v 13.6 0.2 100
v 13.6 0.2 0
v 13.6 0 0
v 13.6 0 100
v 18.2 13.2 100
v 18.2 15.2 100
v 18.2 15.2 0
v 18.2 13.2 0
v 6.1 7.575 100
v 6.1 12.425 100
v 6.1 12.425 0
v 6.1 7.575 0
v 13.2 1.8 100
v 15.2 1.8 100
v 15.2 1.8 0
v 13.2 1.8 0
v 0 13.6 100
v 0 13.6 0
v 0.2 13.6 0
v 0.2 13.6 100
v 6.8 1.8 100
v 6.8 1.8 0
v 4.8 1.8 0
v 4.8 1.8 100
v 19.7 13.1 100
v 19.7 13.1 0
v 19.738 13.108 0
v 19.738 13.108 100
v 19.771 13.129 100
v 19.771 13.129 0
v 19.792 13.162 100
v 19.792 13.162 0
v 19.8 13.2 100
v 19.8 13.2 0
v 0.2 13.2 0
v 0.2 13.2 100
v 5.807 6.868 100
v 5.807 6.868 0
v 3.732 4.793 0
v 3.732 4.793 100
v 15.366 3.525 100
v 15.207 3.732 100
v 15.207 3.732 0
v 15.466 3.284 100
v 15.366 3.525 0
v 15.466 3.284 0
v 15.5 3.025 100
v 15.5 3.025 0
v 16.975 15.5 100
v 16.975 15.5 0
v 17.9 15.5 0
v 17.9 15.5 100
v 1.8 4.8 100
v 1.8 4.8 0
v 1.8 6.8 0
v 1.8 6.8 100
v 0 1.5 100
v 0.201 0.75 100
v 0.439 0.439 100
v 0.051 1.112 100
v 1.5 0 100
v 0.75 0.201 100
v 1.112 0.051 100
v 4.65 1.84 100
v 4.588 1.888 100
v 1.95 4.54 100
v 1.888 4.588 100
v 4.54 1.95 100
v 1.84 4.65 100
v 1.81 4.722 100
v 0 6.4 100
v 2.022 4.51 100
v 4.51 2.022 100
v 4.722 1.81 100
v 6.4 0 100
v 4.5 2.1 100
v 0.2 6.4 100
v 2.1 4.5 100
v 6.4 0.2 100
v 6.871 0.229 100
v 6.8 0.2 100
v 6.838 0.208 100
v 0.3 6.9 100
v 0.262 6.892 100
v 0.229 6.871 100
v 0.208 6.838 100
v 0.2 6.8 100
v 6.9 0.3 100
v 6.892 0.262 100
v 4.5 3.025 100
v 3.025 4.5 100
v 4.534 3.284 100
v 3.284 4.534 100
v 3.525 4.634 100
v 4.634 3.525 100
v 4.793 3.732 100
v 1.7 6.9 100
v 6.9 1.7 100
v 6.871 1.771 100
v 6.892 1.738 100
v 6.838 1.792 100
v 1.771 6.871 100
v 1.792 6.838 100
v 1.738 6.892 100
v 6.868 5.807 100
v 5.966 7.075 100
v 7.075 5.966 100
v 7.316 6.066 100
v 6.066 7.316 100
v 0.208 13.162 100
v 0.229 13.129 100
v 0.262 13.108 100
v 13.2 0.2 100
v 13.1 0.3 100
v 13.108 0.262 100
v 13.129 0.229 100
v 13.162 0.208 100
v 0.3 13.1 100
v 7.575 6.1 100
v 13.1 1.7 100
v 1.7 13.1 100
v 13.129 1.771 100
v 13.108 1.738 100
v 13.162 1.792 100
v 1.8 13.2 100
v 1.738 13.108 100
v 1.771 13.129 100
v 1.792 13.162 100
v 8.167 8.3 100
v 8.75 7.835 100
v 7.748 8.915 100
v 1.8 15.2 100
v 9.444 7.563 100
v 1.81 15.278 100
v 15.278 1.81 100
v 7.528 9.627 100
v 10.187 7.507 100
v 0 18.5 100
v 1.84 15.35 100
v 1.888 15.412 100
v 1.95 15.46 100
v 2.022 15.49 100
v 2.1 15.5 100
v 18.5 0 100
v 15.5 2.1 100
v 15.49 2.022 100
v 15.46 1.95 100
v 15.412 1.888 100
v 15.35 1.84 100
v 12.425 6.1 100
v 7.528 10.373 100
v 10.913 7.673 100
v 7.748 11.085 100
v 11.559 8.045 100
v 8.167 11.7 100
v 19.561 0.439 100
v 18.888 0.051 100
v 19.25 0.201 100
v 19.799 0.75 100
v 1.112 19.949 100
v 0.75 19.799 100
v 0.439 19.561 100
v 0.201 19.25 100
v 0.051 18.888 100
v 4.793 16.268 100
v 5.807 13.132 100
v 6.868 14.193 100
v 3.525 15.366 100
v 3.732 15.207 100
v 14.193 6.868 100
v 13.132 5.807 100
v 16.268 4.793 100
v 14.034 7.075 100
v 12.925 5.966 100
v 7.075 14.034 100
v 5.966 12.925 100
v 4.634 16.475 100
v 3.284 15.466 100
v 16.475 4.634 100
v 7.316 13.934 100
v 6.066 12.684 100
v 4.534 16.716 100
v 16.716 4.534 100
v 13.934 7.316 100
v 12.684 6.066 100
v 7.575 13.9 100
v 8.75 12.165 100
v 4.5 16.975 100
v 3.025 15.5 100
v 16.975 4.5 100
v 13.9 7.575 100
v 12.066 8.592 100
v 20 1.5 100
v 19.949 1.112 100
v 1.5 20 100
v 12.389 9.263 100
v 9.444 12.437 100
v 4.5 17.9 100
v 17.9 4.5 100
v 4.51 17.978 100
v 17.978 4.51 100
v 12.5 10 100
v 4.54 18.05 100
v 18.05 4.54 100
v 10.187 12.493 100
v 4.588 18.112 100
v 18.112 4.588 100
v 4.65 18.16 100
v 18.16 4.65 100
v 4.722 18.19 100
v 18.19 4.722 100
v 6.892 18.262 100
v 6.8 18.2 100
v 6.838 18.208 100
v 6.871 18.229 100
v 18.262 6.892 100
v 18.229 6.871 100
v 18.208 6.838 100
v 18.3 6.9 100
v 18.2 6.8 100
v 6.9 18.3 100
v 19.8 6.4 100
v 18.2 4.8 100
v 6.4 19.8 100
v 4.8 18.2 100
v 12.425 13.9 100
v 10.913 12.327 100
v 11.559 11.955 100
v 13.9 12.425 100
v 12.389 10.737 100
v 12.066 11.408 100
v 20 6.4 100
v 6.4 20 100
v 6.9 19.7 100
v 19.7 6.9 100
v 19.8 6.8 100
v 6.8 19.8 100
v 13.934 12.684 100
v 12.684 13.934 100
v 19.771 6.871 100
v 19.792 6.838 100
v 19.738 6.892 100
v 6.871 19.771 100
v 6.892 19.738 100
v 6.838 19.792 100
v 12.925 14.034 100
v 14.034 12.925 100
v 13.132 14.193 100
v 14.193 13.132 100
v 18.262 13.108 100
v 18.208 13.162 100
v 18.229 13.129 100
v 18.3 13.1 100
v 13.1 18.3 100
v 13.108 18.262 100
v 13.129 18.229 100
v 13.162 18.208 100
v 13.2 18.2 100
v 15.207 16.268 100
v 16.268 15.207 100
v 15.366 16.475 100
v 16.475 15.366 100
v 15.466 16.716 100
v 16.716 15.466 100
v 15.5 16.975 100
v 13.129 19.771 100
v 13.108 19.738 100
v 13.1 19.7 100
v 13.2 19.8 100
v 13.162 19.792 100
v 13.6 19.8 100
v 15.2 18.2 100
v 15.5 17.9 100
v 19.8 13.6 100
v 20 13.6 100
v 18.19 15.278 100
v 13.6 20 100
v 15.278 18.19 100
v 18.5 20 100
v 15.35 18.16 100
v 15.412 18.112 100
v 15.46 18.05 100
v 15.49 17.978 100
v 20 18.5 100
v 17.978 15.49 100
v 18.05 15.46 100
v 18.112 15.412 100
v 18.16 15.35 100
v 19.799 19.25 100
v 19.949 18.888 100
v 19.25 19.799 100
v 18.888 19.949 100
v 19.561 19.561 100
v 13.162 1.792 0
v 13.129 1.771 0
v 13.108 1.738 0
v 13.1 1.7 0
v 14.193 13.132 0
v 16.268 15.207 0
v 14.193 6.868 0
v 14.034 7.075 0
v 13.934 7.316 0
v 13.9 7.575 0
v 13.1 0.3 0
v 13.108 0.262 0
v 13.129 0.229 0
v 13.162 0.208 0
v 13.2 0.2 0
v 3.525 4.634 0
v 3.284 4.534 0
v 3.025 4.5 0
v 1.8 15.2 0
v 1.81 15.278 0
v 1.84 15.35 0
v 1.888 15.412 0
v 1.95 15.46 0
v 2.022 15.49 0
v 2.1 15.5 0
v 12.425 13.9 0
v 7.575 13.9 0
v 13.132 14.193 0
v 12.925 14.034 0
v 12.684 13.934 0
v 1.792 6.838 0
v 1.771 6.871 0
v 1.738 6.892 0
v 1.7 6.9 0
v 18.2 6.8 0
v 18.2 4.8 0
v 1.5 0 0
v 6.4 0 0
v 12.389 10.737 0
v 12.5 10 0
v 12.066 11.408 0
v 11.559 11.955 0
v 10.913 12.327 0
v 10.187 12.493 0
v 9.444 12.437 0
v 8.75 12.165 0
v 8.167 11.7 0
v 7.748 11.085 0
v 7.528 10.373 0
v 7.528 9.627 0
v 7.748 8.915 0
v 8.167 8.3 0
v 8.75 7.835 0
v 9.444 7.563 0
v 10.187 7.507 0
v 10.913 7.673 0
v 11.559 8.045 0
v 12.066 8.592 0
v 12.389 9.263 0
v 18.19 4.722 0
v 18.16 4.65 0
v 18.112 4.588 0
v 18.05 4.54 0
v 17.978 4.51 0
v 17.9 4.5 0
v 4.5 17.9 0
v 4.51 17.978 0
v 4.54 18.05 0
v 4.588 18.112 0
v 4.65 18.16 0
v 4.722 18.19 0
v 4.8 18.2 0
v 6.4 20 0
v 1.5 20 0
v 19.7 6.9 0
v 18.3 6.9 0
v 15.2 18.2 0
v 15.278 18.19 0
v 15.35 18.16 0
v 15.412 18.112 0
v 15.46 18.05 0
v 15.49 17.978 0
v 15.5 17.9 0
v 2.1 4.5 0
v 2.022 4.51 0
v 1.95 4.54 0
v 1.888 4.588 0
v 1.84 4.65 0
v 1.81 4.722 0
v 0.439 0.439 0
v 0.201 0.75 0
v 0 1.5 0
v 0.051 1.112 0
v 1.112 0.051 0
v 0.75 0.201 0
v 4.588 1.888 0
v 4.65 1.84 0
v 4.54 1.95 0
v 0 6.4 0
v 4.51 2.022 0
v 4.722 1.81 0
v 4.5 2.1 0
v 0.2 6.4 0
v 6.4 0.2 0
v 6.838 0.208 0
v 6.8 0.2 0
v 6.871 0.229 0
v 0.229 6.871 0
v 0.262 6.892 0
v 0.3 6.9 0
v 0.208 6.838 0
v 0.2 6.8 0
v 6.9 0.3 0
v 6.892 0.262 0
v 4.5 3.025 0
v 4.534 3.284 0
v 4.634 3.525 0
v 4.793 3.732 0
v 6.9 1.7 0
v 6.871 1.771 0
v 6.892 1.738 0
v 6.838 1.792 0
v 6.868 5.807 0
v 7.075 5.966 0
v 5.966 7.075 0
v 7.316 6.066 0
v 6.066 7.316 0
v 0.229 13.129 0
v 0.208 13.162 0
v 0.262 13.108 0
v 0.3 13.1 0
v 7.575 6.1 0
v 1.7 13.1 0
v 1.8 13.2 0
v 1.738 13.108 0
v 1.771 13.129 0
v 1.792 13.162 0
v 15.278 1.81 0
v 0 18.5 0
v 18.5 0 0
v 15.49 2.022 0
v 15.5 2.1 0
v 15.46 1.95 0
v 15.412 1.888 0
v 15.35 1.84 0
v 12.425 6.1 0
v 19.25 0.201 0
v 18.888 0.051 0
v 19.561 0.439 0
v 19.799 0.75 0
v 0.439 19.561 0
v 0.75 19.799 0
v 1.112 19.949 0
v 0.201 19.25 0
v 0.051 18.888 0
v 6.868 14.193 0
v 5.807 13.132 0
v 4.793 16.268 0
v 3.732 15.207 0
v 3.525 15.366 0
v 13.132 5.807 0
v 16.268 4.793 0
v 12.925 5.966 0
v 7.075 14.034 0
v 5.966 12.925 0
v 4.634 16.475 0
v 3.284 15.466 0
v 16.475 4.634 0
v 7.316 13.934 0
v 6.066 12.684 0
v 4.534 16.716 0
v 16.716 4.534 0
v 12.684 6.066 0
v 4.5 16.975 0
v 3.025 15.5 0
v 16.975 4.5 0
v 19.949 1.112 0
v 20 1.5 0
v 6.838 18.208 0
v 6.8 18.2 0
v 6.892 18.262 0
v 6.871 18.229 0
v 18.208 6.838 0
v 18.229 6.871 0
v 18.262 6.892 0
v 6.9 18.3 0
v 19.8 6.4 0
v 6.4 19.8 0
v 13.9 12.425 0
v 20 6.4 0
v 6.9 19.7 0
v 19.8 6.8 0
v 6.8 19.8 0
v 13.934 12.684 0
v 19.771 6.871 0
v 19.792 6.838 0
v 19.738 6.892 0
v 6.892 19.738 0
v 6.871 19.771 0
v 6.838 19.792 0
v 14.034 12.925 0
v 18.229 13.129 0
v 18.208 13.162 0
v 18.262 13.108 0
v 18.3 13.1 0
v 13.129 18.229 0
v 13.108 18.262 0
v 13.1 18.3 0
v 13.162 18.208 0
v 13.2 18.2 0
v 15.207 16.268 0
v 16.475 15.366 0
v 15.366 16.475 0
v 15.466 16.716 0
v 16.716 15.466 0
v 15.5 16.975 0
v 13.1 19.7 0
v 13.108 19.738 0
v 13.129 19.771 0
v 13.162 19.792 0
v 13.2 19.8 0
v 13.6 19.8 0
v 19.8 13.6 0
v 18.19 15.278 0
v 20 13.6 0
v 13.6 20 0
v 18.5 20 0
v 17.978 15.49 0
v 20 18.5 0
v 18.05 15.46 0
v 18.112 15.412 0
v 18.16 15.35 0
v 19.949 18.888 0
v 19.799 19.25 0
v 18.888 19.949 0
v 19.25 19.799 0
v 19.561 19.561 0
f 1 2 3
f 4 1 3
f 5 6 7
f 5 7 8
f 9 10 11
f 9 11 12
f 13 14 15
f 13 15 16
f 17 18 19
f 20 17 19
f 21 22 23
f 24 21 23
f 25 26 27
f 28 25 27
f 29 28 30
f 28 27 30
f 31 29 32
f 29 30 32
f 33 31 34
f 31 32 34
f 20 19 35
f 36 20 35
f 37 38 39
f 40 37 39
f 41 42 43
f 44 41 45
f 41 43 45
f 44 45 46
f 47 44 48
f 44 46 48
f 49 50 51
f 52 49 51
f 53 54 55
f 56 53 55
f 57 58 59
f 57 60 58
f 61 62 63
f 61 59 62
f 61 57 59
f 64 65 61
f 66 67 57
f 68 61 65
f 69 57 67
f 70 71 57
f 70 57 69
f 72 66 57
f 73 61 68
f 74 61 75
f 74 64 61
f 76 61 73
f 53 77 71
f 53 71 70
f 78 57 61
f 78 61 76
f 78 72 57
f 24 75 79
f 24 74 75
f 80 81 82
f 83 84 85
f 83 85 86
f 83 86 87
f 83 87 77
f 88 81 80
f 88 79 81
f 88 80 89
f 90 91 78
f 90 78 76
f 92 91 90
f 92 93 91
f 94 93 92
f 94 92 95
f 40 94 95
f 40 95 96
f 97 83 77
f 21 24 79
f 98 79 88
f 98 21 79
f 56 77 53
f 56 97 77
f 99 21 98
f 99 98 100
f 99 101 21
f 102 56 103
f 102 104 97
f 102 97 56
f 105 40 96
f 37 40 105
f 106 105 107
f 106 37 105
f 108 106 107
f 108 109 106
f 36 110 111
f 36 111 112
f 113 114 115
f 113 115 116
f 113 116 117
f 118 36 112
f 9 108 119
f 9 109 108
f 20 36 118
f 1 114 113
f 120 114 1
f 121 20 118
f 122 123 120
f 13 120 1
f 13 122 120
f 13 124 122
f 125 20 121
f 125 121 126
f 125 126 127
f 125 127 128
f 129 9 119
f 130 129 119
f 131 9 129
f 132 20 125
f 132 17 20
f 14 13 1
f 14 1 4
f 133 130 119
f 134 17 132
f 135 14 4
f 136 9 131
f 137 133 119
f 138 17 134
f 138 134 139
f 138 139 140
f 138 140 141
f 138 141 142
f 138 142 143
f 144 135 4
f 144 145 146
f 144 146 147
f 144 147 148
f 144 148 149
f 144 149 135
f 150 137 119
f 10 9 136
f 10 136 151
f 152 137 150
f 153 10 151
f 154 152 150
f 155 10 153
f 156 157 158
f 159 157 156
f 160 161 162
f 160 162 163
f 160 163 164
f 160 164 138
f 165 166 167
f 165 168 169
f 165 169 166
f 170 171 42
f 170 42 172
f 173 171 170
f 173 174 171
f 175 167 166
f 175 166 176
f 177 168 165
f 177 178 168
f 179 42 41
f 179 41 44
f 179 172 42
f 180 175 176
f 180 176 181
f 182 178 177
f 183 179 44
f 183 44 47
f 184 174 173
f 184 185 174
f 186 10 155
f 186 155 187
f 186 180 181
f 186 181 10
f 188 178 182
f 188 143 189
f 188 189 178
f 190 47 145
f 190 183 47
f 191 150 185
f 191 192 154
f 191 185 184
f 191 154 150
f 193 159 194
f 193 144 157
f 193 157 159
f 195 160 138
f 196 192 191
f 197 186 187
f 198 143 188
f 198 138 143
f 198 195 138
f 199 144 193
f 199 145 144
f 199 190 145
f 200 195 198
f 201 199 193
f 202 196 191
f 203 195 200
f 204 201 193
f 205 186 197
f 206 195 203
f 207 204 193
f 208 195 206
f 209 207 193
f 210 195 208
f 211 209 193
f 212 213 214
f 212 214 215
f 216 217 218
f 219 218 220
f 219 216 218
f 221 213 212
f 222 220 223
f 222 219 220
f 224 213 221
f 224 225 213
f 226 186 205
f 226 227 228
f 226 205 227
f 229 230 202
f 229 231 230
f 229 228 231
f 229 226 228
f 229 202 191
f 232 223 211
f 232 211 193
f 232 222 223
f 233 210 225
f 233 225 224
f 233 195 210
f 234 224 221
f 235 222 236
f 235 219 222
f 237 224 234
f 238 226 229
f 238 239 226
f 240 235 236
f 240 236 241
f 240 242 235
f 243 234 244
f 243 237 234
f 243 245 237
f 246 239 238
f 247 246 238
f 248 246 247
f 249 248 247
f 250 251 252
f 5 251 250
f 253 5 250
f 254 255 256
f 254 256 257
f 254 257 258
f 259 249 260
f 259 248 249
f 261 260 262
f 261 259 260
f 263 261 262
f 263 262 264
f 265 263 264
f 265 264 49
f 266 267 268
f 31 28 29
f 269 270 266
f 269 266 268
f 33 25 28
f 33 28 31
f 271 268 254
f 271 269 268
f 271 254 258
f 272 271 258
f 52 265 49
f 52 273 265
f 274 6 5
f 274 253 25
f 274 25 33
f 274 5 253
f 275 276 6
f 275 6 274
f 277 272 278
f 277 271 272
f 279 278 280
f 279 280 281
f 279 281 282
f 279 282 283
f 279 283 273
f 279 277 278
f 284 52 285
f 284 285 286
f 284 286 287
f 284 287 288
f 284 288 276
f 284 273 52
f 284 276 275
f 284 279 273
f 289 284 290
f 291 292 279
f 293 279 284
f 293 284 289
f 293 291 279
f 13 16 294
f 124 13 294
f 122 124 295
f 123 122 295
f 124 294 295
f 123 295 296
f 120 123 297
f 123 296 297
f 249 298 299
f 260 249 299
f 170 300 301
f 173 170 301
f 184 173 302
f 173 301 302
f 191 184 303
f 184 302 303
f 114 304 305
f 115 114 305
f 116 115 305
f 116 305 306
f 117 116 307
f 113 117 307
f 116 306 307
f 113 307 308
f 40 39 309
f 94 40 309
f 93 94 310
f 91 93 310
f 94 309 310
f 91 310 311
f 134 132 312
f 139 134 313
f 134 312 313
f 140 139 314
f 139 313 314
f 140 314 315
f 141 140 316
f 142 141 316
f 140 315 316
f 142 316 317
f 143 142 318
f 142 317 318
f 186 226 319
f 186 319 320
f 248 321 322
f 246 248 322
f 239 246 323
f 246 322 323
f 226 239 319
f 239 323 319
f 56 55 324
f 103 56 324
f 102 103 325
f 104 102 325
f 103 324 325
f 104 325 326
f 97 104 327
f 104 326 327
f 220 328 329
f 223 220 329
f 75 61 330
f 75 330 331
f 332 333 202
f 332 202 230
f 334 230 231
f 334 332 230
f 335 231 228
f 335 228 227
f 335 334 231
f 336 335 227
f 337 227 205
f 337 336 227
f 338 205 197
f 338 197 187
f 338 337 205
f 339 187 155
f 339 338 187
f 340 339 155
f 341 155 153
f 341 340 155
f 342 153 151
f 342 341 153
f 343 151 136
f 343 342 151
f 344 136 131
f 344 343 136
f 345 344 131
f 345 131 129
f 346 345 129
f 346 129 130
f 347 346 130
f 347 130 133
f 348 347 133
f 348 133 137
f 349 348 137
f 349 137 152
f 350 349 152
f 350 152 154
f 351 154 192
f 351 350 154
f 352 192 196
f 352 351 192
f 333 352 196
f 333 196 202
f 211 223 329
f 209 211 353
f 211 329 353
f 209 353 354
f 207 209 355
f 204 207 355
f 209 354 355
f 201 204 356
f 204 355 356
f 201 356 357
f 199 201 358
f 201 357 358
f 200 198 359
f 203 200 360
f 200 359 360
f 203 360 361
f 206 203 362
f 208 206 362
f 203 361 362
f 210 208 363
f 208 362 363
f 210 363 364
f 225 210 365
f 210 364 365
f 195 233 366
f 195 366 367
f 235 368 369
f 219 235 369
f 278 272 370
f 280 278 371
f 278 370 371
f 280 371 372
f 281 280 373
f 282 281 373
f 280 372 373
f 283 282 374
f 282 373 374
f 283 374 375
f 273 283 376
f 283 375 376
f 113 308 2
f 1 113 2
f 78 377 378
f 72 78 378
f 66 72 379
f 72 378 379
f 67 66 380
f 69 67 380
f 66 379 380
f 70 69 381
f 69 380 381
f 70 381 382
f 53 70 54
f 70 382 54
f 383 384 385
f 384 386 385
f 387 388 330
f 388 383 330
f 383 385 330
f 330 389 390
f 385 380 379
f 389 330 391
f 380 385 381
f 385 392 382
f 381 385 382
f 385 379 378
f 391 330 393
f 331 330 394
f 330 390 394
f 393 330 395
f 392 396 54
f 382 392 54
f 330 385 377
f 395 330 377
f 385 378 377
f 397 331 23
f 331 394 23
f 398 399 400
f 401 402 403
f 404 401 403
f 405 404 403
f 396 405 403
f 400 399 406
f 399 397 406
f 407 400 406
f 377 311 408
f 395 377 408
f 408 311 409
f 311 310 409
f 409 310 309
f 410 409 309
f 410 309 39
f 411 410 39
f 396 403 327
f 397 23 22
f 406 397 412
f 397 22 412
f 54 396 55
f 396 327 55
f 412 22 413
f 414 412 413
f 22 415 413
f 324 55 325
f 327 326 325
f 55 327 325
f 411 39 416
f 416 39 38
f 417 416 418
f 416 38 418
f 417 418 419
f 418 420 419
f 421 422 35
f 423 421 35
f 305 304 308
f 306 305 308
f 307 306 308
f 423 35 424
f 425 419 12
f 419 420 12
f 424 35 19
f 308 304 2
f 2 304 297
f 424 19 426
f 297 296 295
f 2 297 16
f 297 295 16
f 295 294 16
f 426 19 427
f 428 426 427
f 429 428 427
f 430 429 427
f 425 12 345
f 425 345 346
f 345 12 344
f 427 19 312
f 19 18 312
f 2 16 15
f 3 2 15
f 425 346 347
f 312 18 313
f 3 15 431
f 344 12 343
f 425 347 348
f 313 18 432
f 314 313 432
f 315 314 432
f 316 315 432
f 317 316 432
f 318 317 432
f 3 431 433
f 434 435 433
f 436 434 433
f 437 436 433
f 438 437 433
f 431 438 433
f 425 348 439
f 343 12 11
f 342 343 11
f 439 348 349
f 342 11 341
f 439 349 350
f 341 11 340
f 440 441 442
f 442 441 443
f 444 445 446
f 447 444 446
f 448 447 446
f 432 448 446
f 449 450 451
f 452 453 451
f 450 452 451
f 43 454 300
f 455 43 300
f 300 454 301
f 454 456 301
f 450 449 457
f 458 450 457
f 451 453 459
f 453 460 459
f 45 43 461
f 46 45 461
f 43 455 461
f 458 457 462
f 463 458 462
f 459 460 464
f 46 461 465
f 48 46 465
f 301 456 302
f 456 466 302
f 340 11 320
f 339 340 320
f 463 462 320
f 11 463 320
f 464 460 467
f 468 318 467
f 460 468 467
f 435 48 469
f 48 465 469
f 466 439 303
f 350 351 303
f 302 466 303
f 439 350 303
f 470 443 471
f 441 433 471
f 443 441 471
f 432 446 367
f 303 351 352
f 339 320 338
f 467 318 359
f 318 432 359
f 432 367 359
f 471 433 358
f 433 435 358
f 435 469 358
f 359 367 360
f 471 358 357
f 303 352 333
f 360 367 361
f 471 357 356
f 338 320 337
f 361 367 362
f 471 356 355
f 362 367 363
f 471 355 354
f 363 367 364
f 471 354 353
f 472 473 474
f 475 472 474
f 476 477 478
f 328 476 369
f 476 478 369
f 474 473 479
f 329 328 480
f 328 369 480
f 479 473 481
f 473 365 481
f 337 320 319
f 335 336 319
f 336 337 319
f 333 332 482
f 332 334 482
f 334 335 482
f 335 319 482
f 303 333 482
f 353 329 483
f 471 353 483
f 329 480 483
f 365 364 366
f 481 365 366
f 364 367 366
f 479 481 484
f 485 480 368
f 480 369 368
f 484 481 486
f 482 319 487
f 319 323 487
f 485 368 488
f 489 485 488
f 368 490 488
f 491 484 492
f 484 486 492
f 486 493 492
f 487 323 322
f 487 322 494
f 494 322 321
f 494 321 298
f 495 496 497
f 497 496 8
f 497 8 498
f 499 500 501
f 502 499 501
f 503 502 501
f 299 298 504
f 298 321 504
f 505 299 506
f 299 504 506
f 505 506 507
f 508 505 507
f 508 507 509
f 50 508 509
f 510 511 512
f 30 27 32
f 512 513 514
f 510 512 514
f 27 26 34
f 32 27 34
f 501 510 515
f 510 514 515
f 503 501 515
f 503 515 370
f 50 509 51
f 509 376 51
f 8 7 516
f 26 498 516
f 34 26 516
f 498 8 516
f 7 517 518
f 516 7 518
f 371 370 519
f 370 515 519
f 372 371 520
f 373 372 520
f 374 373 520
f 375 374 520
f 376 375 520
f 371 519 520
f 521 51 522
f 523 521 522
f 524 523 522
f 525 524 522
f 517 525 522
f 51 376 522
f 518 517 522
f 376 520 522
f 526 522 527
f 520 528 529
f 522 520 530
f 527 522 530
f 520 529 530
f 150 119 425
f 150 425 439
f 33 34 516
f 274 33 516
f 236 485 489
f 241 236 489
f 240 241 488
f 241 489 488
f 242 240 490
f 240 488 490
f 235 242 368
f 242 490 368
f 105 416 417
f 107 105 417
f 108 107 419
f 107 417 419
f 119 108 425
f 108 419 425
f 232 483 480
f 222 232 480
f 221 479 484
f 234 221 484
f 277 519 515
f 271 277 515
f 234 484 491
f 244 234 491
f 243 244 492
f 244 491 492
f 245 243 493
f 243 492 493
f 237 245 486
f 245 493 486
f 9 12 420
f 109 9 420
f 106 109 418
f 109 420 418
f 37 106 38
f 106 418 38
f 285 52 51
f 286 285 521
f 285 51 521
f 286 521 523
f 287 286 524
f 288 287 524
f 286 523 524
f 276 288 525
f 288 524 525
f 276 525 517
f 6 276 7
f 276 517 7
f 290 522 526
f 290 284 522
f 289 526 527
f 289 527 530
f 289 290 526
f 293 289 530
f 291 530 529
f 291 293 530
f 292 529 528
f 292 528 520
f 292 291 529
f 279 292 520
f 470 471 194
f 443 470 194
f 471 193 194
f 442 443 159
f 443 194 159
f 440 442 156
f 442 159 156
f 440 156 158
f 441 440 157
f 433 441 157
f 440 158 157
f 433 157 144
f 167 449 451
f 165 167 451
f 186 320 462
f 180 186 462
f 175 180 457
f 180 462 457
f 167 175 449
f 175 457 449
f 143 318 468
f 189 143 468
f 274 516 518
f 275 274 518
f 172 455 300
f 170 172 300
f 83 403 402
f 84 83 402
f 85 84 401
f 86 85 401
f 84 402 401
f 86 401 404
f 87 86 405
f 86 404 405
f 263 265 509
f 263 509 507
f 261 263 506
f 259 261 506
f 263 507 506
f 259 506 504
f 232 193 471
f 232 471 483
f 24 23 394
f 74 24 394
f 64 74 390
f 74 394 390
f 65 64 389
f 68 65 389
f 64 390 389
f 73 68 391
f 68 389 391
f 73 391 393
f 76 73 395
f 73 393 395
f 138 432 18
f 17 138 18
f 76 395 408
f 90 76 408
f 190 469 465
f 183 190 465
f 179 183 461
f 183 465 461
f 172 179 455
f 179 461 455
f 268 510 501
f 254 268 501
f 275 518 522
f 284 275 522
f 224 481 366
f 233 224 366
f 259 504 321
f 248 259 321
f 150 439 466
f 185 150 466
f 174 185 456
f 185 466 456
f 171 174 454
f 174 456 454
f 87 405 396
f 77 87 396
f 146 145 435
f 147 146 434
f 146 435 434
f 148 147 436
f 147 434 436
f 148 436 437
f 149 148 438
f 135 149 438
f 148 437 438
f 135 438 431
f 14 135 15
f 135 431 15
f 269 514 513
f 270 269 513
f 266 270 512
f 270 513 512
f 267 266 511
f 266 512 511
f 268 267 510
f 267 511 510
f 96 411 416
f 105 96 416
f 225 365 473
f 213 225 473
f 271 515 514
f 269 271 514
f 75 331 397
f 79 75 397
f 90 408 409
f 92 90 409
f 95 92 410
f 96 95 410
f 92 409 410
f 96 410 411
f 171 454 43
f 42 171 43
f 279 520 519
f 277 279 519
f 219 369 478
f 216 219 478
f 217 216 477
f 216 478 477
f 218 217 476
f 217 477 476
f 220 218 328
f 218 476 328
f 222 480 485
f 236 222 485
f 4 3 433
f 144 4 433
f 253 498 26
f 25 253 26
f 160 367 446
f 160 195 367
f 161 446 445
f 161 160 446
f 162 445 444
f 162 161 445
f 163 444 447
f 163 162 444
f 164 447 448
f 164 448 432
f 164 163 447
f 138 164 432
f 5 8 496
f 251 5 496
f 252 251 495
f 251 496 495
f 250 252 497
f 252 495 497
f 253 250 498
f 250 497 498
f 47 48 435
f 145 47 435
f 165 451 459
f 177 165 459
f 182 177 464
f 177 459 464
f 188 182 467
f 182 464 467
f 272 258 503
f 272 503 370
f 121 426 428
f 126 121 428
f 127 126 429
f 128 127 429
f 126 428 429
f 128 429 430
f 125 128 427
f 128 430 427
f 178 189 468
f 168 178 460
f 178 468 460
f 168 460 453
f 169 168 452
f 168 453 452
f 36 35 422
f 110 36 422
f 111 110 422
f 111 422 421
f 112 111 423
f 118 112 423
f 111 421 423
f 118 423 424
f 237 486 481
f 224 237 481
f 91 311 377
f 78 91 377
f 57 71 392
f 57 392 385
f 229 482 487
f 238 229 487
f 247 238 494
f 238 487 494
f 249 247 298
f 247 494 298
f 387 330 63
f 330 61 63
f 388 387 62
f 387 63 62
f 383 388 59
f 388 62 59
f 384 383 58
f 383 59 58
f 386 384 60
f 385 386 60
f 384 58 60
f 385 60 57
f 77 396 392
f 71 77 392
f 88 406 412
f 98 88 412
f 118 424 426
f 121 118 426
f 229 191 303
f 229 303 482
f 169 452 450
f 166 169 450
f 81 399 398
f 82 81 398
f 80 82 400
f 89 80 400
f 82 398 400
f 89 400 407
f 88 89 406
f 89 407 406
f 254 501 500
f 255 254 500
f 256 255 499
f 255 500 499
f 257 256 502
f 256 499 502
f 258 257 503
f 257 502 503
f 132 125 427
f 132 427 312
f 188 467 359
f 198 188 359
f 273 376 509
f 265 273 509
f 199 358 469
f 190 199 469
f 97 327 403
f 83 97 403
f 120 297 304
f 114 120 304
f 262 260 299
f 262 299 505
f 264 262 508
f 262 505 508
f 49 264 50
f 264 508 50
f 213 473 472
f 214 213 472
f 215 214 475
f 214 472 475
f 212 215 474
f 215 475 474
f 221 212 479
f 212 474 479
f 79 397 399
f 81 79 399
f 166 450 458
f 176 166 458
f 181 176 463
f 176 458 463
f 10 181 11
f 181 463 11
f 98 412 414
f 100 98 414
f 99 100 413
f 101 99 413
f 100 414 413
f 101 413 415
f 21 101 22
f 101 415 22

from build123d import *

# Parameters (mm, degrees)
SKETCH_1_R      = 2.5
EXTRUDE_1_DEPTH = 100
FILLET_1_R      = 1.5


with BuildPart() as part:
    # 草图1 → 凸台-拉伸1 (new body)
    with BuildSketch(Plane.XY):
        with BuildLine():
            Line((20, 13.6), (20, 20))
            Line((20, 20), (13.6, 20))
            Line((13.6, 20), (13.6, 19.8))
            Line((13.6, 19.8), (13.2, 19.8))
            ThreePointArc((13.2, 19.8), (13.129289322, 19.770710678), (13.1, 19.7))
            Line((13.1, 19.7), (13.1, 18.3))
            ThreePointArc((13.1, 18.3), (13.129289322, 18.229289322), (13.2, 18.2))
            Line((13.2, 18.2), (15.2, 18.2))
            ThreePointArc((15.2, 18.2), (15.412132034, 18.112132034), (15.5, 17.9))
            Line((15.5, 17.9), (15.5, 16.974873734))
            ThreePointArc((15.5, 16.974873734), (15.423879533, 16.592190302), (15.207106781, 16.267766953))
            Line((15.207106781, 16.267766953), (13.132233047, 14.192893219))
            ThreePointArc((13.132233047, 14.192893219), (12.807809698, 13.976120467), (12.425126266, 13.9))
            Line((12.425126266, 13.9), (7.574873734, 13.9))
            ThreePointArc((7.574873734, 13.9), (7.192190302, 13.976120467), (6.867766953, 14.192893219))
            Line((6.867766953, 14.192893219), (4.792893219, 16.267766953))
            ThreePointArc((4.792893219, 16.267766953), (4.576120467, 16.592190302), (4.5, 16.974873734))
            Line((4.5, 16.974873734), (4.5, 17.9))
            ThreePointArc((4.5, 17.9), (4.587867966, 18.112132034), (4.8, 18.2))
            Line((4.8, 18.2), (6.8, 18.2))
            ThreePointArc((6.8, 18.2), (6.870710678, 18.229289322), (6.9, 18.3))
            Line((6.9, 18.3), (6.9, 19.7))
            ThreePointArc((6.9, 19.7), (6.870710678, 19.770710678), (6.8, 19.8))
            Line((6.8, 19.8), (6.4, 19.8))
            Line((6.4, 19.8), (6.4, 20))
            Line((6.4, 20), (0, 20))
            Line((0, 20), (0, 13.6))
            Line((0, 13.6), (0.2, 13.6))
            Line((0.2, 13.6), (0.2, 13.2))
            ThreePointArc((0.2, 13.2), (0.229289322, 13.129289322), (0.3, 13.1))
            Line((0.3, 13.1), (1.7, 13.1))
            ThreePointArc((1.7, 13.1), (1.770710678, 13.129289322), (1.8, 13.2))
            Line((1.8, 13.2), (1.8, 15.2))
            ThreePointArc((1.8, 15.2), (1.887867966, 15.412132034), (2.1, 15.5))
            Line((2.1, 15.5), (3.025126266, 15.5))
            ThreePointArc((3.025126266, 15.5), (3.407809698, 15.423879533), (3.732233047, 15.207106781))
            Line((3.732233047, 15.207106781), (5.807106781, 13.132233047))
            ThreePointArc((5.807106781, 13.132233047), (6.023879533, 12.807809698), (6.1, 12.425126266))
            Line((6.1, 12.425126266), (6.1, 7.574873734))
            ThreePointArc((6.1, 7.574873734), (6.023879533, 7.192190302), (5.807106781, 6.867766953))
            Line((5.807106781, 6.867766953), (3.732233047, 4.792893219))
            ThreePointArc((3.732233047, 4.792893219), (3.407809698, 4.576120467), (3.025126266, 4.5))
            Line((3.025126266, 4.5), (2.1, 4.5))
            ThreePointArc((2.1, 4.5), (1.887867966, 4.587867966), (1.8, 4.8))
            Line((1.8, 4.8), (1.8, 6.8))
            ThreePointArc((1.8, 6.8), (1.770710678, 6.870710678), (1.7, 6.9))
            Line((1.7, 6.9), (0.3, 6.9))
            ThreePointArc((0.3, 6.9), (0.229289322, 6.870710678), (0.2, 6.8))
            Line((0.2, 6.8), (0.2, 6.4))
            Line((0.2, 6.4), (0, 6.4))
            Line((0, 6.4), (0, 0))
            Line((0, 0), (6.4, 0))
            Line((6.4, 0), (6.4, 0.2))
            Line((6.4, 0.2), (6.8, 0.2))
            ThreePointArc((6.8, 0.2), (6.870710678, 0.229289322), (6.9, 0.3))
            Line((6.9, 0.3), (6.9, 1.7))
            ThreePointArc((6.9, 1.7), (6.870710678, 1.770710678), (6.8, 1.8))
            Line((6.8, 1.8), (4.8, 1.8))
            ThreePointArc((4.8, 1.8), (4.587867966, 1.887867966), (4.5, 2.1))
            Line((4.5, 2.1), (4.5, 3.025126266))
            ThreePointArc((4.5, 3.025126266), (4.576120467, 3.407809698), (4.792893219, 3.732233047))
            Line((4.792893219, 3.732233047), (6.867766953, 5.807106781))
            ThreePointArc((6.867766953, 5.807106781), (7.192190302, 6.023879533), (7.574873734, 6.1))
            Line((7.574873734, 6.1), (12.425126266, 6.1))
            ThreePointArc((12.425126266, 6.1), (12.807809698, 6.023879533), (13.132233047, 5.807106781))
            Line((13.132233047, 5.807106781), (15.207106781, 3.732233047))
            ThreePointArc((15.207106781, 3.732233047), (15.423879533, 3.407809698), (15.5, 3.025126266))
            Line((15.5, 3.025126266), (15.5, 2.1))
            ThreePointArc((15.5, 2.1), (15.412132034, 1.887867966), (15.2, 1.8))
            Line((15.2, 1.8), (13.2, 1.8))
            ThreePointArc((13.2, 1.8), (13.129289322, 1.770710678), (13.1, 1.7))
            Line((13.1, 1.7), (13.1, 0.3))
            ThreePointArc((13.1, 0.3), (13.129289322, 0.229289322), (13.2, 0.2))
            Line((13.2, 0.2), (13.6, 0.2))
            Line((13.6, 0.2), (13.6, 0))
            Line((13.6, 0), (20, 0))
            Line((20, 0), (20, 6.4))
            Line((20, 6.4), (19.8, 6.4))
            Line((19.8, 6.4), (19.8, 6.8))
            ThreePointArc((19.8, 6.8), (19.770710678, 6.870710678), (19.7, 6.9))
            Line((19.7, 6.9), (18.3, 6.9))
            ThreePointArc((18.3, 6.9), (18.229289322, 6.870710678), (18.2, 6.8))
            Line((18.2, 6.8), (18.2, 4.8))
            ThreePointArc((18.2, 4.8), (18.112132034, 4.587867966), (17.9, 4.5))
            Line((17.9, 4.5), (16.974873734, 4.5))
            ThreePointArc((16.974873734, 4.5), (16.592190302, 4.576120467), (16.267766953, 4.792893219))
            Line((16.267766953, 4.792893219), (14.192893219, 6.867766953))
            ThreePointArc((14.192893219, 6.867766953), (13.976120467, 7.192190302), (13.9, 7.574873734))
            Line((13.9, 7.574873734), (13.9, 12.425126266))
            ThreePointArc((13.9, 12.425126266), (13.976120467, 12.807809698), (14.192893219, 13.132233047))
            Line((14.192893219, 13.132233047), (16.267766953, 15.207106781))
            ThreePointArc((16.267766953, 15.207106781), (16.592190302, 15.423879533), (16.974873734, 15.5))
            Line((16.974873734, 15.5), (17.9, 15.5))
            ThreePointArc((17.9, 15.5), (18.112132034, 15.412132034), (18.2, 15.2))
            Line((18.2, 15.2), (18.2, 13.2))
            ThreePointArc((18.2, 13.2), (18.229289322, 13.129289322), (18.3, 13.1))
            Line((18.3, 13.1), (19.7, 13.1))
            ThreePointArc((19.7, 13.1), (19.770710678, 13.129289322), (19.8, 13.2))
            Line((19.8, 13.2), (19.8, 13.6))
            Line((19.8, 13.6), (20, 13.6))
        make_face()
        with Locations((10, 10)):
            Circle(SKETCH_1_R, mode=Mode.SUBTRACT)
    extrude(amount=EXTRUDE_1_DEPTH)

    # 圆角1
    fillet_1_edges = [part.edges().sort_by_distance(p)[0] for p in [
        (0, 0, 50),
        (0, 20, 50),
        (20, 20, 50),
        (20, 0, 50),
    ]]
    fillet(fillet_1_edges, radius=FILLET_1_R)


solid = part.part
